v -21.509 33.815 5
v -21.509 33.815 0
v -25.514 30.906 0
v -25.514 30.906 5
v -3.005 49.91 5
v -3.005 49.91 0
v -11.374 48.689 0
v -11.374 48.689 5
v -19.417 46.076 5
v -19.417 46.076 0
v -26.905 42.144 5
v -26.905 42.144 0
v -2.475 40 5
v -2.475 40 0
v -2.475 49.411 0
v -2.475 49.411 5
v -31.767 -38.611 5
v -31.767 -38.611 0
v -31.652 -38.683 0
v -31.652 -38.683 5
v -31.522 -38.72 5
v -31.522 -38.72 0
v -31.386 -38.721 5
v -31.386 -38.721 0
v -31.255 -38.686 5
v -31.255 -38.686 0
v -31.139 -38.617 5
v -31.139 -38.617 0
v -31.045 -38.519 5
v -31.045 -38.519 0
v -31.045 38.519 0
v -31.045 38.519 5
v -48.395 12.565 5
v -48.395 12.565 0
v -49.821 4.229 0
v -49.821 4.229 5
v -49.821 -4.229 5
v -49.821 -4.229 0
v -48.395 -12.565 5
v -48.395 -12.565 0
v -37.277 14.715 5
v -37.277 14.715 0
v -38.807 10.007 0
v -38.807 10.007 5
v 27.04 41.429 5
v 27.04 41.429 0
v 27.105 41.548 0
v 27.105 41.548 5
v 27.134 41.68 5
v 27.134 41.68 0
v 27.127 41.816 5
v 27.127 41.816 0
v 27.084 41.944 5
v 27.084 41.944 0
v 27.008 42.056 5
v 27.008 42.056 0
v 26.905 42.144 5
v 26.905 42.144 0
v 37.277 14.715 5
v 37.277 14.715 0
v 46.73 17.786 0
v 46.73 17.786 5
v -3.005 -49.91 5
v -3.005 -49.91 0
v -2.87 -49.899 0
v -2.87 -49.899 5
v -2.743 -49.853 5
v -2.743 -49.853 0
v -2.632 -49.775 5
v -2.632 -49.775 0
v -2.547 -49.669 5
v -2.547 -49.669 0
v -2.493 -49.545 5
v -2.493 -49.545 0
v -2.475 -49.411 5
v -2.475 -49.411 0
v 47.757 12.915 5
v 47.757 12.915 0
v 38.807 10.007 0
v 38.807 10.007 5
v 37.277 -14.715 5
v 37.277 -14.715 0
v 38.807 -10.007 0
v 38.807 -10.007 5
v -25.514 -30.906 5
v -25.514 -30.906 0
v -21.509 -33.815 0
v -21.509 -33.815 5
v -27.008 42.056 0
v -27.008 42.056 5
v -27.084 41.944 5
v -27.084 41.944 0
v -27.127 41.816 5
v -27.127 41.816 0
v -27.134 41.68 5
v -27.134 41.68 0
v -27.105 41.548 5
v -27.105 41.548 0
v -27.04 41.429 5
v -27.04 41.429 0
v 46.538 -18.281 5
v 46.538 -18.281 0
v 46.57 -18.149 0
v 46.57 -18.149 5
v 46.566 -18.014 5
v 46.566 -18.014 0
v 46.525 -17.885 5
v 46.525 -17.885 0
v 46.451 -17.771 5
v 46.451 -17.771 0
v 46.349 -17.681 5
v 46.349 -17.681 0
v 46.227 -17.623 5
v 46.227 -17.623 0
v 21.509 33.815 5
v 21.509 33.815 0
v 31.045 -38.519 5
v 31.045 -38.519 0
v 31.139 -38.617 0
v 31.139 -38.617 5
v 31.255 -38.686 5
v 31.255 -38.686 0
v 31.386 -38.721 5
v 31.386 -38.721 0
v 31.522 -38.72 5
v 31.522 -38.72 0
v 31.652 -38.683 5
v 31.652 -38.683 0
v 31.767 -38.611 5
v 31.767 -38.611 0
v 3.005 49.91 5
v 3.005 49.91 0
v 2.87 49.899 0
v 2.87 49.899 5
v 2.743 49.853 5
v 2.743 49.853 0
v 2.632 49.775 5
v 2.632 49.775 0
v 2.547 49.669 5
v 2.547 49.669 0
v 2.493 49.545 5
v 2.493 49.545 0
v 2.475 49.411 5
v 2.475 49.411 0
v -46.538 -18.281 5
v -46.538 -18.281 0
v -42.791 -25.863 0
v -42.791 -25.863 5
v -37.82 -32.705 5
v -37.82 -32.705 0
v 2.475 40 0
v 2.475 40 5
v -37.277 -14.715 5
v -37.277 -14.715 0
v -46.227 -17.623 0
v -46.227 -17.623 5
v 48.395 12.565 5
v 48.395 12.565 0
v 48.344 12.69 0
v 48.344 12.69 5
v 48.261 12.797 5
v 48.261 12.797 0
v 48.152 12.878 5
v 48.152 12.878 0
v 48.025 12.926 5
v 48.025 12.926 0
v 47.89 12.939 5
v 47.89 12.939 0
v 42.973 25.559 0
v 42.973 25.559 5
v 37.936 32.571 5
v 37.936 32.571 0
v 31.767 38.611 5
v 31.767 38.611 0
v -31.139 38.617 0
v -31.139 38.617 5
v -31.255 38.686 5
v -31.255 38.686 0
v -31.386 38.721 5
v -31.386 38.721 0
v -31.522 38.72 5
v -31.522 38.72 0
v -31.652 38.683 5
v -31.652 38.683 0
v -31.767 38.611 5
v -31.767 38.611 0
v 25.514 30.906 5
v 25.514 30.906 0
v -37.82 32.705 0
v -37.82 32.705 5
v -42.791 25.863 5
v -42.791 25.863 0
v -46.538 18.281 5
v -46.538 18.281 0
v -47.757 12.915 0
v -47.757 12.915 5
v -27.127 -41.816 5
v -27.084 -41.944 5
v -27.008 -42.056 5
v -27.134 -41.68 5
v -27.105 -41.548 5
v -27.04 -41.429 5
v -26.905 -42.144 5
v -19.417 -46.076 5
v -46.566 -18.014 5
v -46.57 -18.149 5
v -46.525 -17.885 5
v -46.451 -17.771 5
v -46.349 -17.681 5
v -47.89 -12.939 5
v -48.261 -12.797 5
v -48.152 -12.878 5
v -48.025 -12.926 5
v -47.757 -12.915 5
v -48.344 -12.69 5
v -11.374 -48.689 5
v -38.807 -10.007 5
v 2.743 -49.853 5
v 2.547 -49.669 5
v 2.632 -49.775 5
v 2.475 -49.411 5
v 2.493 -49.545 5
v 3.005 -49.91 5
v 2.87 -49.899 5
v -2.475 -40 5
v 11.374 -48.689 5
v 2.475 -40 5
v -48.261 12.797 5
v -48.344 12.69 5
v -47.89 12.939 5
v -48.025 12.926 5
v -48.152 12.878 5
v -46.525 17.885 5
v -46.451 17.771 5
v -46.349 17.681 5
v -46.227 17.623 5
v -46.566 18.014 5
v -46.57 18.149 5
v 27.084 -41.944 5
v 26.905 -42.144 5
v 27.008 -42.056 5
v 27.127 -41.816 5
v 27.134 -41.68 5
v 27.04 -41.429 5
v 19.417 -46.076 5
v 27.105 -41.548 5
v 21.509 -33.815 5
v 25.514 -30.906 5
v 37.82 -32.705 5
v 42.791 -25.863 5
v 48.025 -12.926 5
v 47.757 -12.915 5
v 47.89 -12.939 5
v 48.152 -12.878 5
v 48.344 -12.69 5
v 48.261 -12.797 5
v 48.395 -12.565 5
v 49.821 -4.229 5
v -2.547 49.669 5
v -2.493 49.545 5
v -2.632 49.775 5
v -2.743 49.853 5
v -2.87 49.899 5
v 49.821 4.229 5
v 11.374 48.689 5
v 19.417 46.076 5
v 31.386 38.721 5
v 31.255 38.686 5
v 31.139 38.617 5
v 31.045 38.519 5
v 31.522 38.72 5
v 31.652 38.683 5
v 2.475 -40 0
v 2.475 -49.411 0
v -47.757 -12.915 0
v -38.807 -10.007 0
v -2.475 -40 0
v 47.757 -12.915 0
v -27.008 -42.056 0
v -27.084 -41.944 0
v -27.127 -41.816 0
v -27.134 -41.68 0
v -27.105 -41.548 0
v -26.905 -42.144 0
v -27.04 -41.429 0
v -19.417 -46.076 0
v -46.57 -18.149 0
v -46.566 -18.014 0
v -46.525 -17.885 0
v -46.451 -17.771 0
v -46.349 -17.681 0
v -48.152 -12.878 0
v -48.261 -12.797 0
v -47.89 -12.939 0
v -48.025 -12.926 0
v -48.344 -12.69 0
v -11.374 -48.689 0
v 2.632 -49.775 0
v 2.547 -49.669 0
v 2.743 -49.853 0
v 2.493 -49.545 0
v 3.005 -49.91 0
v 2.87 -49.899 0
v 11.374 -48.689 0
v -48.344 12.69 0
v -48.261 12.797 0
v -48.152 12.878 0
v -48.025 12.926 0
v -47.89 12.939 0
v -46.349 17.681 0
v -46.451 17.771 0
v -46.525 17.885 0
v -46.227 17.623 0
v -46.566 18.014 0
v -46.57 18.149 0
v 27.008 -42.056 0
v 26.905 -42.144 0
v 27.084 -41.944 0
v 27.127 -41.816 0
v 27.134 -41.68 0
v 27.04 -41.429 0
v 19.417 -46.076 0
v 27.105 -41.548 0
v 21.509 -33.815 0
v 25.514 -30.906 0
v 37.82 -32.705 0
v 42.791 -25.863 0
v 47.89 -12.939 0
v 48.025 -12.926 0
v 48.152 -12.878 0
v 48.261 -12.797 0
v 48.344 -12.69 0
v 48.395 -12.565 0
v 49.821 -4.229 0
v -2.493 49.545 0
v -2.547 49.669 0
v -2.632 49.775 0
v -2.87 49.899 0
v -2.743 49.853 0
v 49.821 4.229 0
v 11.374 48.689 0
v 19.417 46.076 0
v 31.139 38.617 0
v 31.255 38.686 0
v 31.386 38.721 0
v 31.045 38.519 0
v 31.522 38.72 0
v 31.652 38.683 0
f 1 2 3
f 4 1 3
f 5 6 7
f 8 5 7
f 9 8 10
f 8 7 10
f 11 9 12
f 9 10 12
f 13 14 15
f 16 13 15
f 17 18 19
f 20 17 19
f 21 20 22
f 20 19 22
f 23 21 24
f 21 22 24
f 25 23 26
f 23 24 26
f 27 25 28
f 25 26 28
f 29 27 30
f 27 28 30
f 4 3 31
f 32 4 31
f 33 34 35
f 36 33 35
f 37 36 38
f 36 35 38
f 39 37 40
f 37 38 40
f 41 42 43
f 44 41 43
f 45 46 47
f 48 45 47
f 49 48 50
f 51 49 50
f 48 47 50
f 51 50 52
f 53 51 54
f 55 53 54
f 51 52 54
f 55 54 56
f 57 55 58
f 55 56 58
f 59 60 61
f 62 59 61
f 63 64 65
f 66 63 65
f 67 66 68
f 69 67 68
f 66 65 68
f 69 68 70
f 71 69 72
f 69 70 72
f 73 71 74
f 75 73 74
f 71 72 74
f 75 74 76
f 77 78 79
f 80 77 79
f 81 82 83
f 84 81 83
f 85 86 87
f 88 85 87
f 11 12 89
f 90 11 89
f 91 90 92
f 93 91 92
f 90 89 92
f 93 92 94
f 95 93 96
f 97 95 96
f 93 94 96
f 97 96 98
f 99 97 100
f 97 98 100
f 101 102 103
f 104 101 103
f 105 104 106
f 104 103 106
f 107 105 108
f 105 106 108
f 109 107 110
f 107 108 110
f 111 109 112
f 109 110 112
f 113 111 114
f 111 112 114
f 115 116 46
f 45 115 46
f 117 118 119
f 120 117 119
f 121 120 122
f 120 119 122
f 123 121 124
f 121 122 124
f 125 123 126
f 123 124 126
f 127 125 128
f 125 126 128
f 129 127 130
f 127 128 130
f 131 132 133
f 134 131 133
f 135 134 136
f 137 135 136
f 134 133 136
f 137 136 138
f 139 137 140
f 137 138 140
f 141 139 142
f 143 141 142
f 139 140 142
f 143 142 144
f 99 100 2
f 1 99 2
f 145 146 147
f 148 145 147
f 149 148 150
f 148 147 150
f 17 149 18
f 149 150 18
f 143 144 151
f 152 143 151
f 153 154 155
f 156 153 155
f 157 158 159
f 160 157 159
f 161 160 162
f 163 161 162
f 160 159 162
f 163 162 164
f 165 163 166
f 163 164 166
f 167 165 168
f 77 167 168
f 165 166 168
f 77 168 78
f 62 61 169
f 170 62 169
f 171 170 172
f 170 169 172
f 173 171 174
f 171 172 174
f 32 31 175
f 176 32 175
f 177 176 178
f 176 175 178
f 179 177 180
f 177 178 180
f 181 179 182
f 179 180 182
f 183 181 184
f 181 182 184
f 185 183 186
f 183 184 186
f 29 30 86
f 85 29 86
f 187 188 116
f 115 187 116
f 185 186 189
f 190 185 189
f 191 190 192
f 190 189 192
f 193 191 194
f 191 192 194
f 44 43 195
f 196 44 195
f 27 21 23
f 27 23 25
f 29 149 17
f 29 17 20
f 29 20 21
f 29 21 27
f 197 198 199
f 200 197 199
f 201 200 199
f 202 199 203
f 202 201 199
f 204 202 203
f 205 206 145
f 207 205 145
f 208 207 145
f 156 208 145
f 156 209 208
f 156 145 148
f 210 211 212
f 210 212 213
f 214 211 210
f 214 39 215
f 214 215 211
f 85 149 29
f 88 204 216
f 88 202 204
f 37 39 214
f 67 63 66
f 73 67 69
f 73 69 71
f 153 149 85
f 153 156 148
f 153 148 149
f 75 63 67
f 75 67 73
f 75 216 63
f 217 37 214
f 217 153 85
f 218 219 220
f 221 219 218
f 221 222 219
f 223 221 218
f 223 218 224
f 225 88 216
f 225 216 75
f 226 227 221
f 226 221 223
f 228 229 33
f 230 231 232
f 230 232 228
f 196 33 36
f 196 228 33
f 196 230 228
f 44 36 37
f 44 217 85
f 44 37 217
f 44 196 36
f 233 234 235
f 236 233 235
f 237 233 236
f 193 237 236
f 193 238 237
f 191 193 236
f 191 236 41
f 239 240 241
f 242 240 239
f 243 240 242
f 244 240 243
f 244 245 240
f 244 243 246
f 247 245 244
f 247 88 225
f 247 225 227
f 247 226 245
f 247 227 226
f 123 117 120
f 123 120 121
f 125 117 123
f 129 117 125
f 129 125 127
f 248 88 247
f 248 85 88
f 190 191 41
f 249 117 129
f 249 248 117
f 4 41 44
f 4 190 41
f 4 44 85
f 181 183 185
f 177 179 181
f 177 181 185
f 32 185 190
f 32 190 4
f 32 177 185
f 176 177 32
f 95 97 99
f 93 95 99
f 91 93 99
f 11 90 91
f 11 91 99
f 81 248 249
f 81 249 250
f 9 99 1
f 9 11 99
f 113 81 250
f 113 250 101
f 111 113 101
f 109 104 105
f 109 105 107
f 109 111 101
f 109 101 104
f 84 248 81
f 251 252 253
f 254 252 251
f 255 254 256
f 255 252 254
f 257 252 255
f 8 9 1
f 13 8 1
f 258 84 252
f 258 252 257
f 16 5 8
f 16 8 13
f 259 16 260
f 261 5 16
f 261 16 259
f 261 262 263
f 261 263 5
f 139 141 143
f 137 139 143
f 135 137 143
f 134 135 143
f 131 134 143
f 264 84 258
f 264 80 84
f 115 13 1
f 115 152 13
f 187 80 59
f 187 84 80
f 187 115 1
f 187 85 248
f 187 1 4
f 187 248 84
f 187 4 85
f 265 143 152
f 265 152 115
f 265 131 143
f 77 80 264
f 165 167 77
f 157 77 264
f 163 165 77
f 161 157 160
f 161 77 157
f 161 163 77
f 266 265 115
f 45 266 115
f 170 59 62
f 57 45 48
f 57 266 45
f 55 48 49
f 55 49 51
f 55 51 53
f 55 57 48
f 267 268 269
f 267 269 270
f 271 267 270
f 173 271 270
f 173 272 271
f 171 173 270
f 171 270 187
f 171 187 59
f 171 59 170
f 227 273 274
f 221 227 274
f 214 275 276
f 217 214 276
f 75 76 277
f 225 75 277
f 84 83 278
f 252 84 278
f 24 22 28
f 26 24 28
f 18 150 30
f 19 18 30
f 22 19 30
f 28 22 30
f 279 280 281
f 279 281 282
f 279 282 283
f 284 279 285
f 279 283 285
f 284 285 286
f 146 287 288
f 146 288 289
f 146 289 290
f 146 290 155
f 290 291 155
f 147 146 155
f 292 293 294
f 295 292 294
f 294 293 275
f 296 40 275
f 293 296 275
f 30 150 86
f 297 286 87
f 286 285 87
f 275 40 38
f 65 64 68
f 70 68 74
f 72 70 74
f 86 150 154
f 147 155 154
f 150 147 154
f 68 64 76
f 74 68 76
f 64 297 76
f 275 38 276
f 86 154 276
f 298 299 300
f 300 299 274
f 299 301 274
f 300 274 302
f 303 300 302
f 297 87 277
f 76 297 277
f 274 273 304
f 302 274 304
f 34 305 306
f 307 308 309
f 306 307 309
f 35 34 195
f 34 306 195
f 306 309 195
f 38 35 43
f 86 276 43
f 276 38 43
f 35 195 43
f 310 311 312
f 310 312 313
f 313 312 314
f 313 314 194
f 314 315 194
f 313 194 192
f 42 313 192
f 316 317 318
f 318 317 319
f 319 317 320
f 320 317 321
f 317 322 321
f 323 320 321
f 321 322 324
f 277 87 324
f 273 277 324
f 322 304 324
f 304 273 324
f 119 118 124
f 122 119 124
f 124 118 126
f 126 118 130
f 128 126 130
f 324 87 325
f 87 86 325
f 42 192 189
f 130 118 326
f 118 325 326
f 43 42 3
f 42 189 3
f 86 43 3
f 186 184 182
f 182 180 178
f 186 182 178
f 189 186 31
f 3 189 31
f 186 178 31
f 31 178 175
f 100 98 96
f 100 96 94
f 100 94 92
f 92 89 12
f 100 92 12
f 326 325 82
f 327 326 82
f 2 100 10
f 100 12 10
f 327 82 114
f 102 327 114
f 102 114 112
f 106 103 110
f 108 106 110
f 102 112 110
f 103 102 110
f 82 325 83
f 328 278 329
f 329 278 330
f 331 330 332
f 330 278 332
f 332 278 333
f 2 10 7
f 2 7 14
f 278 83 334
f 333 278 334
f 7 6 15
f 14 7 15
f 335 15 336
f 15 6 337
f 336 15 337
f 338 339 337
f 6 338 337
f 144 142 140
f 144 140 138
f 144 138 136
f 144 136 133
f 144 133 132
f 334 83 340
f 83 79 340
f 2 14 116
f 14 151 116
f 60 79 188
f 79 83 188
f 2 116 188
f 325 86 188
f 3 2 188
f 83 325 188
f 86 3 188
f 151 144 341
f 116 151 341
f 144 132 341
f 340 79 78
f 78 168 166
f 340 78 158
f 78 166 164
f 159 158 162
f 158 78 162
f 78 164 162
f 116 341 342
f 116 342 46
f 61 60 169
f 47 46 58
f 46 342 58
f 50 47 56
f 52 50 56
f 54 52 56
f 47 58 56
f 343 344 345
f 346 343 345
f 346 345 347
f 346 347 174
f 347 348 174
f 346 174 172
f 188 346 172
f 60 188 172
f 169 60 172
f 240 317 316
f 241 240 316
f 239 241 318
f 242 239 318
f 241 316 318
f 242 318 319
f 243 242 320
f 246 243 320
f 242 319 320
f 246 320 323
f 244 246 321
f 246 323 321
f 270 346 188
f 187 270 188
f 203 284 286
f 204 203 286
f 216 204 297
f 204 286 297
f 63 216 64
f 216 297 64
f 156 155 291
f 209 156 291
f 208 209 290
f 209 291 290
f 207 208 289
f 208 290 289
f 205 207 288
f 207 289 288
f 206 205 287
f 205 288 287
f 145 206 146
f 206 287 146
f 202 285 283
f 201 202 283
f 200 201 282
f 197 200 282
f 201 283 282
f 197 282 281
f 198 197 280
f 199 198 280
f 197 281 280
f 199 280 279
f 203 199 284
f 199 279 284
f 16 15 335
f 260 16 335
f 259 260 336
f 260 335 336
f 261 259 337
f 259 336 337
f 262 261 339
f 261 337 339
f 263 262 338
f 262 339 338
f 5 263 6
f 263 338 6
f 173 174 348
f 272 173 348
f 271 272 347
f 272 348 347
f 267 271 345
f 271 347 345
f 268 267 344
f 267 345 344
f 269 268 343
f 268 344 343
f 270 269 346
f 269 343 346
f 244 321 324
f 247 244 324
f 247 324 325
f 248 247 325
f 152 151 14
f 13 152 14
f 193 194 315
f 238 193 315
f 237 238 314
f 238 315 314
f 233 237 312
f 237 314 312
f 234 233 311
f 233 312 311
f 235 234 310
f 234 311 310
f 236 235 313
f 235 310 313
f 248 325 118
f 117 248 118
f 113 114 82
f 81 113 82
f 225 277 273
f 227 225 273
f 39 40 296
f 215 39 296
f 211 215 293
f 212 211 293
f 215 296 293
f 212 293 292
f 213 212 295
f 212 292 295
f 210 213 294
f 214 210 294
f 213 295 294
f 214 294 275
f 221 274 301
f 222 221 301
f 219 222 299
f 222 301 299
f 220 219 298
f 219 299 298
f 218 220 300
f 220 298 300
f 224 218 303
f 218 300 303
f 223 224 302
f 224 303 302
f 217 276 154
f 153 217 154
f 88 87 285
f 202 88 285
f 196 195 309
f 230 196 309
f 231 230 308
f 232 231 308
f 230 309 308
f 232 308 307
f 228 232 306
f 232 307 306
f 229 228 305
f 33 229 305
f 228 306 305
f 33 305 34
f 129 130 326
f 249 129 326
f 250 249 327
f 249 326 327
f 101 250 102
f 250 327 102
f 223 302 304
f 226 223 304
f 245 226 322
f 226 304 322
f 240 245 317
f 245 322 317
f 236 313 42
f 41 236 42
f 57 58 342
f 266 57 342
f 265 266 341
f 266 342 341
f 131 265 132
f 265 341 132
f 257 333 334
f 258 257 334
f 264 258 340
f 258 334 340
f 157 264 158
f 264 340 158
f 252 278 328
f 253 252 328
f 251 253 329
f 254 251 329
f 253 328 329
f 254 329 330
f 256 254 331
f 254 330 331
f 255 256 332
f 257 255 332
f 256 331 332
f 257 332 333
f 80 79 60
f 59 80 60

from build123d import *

# Parameters (mm, degrees)
F1_DEPTH = 5


with BuildPart() as f1:
    # F0 (on Top) → F1 (new body)
    with BuildSketch(Plane.XY):
        with BuildLine():
            ThreePointArc((-31.045091, 38.519181), (-31.386265, 38.721261), (-31.767273, 38.611402))
            ThreePointArc((-31.767273, 38.611402), (-40.45085, 29.389263), (-46.538253, 18.280892))
            ThreePointArc((-46.538253, 18.280892), (-46.524997, 17.884584), (-46.227379, 17.622555))
            Line((-46.227379, 17.622555), (-37.277444, 14.714545))
            Line((-37.277444, 14.714545), (-38.807078, 10.006815))
            Line((-38.807078, 10.006815), (-47.757013, 12.914825))
            ThreePointArc((-47.757013, 12.914825), (-48.151808, 12.877774), (-48.395476, 12.564946))
            ThreePointArc((-48.395476, 12.564946), (-50, 0), (-48.395476, -12.564946))
            ThreePointArc((-48.395476, -12.564946), (-48.151808, -12.877774), (-47.757013, -12.914825))
            Line((-47.757013, -12.914825), (-38.807078, -10.006815))
            Line((-38.807078, -10.006815), (-37.277444, -14.714545))
            Line((-37.277444, -14.714545), (-46.227379, -17.622555))
            ThreePointArc((-46.227379, -17.622555), (-46.524997, -17.884584), (-46.538253, -18.280892))
            ThreePointArc((-46.538253, -18.280892), (-40.45085, -29.389263), (-31.767273, -38.611402))
            ThreePointArc((-31.767273, -38.611402), (-31.386265, -38.721261), (-31.045091, -38.519181))
            Line((-31.045091, -38.519181), (-25.513727, -30.905911))
            Line((-25.513727, -30.905911), (-21.509093, -33.815448))
            Line((-21.509093, -33.815448), (-27.040457, -41.428718))
            ThreePointArc((-27.040457, -41.428718), (-27.127218, -41.815639), (-26.904999, -42.144051))
            ThreePointArc((-26.904999, -42.144051), (-15.45085, -47.552826), (-3.005051, -49.909615))
            ThreePointArc((-3.005051, -49.909615), (-2.632236, -49.774542), (-2.475, -49.410519))
            Line((-2.475, -49.410519), (-2.475, -40))
            Line((-2.475, -40), (2.475, -40))
            Line((2.475, -40), (2.475, -49.410519))
            ThreePointArc((2.475, -49.410519), (2.632236, -49.774542), (3.005051, -49.909615))
            ThreePointArc((3.005051, -49.909615), (15.45085, -47.552826), (26.904999, -42.144051))
            ThreePointArc((26.904999, -42.144051), (27.127218, -41.815639), (27.040457, -41.428718))
            Line((27.040457, -41.428718), (21.509093, -33.815448))
            Line((21.509093, -33.815448), (25.513727, -30.905911))
            Line((25.513727, -30.905911), (31.045091, -38.519181))
            ThreePointArc((31.045091, -38.519181), (31.386265, -38.721261), (31.767273, -38.611402))
            ThreePointArc((31.767273, -38.611402), (40.45085, -29.389263), (46.538253, -18.280892))
            ThreePointArc((46.538253, -18.280892), (46.524997, -17.884584), (46.227379, -17.622555))
            Line((46.227379, -17.622555), (37.277444, -14.714545))
            Line((37.277444, -14.714545), (38.807078, -10.006815))
            Line((38.807078, -10.006815), (47.757013, -12.914825))
            ThreePointArc((47.757013, -12.914825), (48.151808, -12.877774), (48.395476, -12.564946))
            ThreePointArc((48.395476, -12.564946), (50, 0), (48.395476, 12.564946))
            ThreePointArc((48.395476, 12.564946), (48.151808, 12.877774), (47.757013, 12.914825))
            Line((47.757013, 12.914825), (38.807078, 10.006815))
            Line((38.807078, 10.006815), (37.277444, 14.714545))
            Line((37.277444, 14.714545), (46.729715, 17.785774))
            ThreePointArc((46.729715, 17.785774), (40.606292, 29.174116), (31.767273, 38.611402))
            ThreePointArc((31.767273, 38.611402), (31.386265, 38.721261), (31.045091, 38.519181))
            Line((31.045091, 38.519181), (25.513727, 30.905911))
            Line((25.513727, 30.905911), (21.509093, 33.815448))
            Line((21.509093, 33.815448), (27.040457, 41.428718))
            ThreePointArc((27.040457, 41.428718), (27.127218, 41.815639), (26.904999, 42.144051))
            ThreePointArc((26.904999, 42.144051), (15.45085, 47.552826), (3.005051, 49.909615))
            ThreePointArc((3.005051, 49.909615), (2.632236, 49.774542), (2.475, 49.410519))
            Line((2.475, 49.410519), (2.475, 40))
            Line((2.475, 40), (-2.475, 40))
            Line((-2.475, 40), (-2.475, 49.410519))
            ThreePointArc((-2.475, 49.410519), (-2.632236, 49.774542), (-3.005051, 49.909615))
            ThreePointArc((-3.005051, 49.909615), (-15.45085, 47.552826), (-26.904999, 42.144051))
            ThreePointArc((-26.904999, 42.144051), (-27.127218, 41.815639), (-27.040457, 41.428718))
            Line((-27.040457, 41.428718), (-21.509093, 33.815448))
            Line((-21.509093, 33.815448), (-25.513727, 30.905911))
            Line((-25.513727, 30.905911), (-31.045091, 38.519181))
        make_face()
    extrude(amount=F1_DEPTH)


solid = f1.part
